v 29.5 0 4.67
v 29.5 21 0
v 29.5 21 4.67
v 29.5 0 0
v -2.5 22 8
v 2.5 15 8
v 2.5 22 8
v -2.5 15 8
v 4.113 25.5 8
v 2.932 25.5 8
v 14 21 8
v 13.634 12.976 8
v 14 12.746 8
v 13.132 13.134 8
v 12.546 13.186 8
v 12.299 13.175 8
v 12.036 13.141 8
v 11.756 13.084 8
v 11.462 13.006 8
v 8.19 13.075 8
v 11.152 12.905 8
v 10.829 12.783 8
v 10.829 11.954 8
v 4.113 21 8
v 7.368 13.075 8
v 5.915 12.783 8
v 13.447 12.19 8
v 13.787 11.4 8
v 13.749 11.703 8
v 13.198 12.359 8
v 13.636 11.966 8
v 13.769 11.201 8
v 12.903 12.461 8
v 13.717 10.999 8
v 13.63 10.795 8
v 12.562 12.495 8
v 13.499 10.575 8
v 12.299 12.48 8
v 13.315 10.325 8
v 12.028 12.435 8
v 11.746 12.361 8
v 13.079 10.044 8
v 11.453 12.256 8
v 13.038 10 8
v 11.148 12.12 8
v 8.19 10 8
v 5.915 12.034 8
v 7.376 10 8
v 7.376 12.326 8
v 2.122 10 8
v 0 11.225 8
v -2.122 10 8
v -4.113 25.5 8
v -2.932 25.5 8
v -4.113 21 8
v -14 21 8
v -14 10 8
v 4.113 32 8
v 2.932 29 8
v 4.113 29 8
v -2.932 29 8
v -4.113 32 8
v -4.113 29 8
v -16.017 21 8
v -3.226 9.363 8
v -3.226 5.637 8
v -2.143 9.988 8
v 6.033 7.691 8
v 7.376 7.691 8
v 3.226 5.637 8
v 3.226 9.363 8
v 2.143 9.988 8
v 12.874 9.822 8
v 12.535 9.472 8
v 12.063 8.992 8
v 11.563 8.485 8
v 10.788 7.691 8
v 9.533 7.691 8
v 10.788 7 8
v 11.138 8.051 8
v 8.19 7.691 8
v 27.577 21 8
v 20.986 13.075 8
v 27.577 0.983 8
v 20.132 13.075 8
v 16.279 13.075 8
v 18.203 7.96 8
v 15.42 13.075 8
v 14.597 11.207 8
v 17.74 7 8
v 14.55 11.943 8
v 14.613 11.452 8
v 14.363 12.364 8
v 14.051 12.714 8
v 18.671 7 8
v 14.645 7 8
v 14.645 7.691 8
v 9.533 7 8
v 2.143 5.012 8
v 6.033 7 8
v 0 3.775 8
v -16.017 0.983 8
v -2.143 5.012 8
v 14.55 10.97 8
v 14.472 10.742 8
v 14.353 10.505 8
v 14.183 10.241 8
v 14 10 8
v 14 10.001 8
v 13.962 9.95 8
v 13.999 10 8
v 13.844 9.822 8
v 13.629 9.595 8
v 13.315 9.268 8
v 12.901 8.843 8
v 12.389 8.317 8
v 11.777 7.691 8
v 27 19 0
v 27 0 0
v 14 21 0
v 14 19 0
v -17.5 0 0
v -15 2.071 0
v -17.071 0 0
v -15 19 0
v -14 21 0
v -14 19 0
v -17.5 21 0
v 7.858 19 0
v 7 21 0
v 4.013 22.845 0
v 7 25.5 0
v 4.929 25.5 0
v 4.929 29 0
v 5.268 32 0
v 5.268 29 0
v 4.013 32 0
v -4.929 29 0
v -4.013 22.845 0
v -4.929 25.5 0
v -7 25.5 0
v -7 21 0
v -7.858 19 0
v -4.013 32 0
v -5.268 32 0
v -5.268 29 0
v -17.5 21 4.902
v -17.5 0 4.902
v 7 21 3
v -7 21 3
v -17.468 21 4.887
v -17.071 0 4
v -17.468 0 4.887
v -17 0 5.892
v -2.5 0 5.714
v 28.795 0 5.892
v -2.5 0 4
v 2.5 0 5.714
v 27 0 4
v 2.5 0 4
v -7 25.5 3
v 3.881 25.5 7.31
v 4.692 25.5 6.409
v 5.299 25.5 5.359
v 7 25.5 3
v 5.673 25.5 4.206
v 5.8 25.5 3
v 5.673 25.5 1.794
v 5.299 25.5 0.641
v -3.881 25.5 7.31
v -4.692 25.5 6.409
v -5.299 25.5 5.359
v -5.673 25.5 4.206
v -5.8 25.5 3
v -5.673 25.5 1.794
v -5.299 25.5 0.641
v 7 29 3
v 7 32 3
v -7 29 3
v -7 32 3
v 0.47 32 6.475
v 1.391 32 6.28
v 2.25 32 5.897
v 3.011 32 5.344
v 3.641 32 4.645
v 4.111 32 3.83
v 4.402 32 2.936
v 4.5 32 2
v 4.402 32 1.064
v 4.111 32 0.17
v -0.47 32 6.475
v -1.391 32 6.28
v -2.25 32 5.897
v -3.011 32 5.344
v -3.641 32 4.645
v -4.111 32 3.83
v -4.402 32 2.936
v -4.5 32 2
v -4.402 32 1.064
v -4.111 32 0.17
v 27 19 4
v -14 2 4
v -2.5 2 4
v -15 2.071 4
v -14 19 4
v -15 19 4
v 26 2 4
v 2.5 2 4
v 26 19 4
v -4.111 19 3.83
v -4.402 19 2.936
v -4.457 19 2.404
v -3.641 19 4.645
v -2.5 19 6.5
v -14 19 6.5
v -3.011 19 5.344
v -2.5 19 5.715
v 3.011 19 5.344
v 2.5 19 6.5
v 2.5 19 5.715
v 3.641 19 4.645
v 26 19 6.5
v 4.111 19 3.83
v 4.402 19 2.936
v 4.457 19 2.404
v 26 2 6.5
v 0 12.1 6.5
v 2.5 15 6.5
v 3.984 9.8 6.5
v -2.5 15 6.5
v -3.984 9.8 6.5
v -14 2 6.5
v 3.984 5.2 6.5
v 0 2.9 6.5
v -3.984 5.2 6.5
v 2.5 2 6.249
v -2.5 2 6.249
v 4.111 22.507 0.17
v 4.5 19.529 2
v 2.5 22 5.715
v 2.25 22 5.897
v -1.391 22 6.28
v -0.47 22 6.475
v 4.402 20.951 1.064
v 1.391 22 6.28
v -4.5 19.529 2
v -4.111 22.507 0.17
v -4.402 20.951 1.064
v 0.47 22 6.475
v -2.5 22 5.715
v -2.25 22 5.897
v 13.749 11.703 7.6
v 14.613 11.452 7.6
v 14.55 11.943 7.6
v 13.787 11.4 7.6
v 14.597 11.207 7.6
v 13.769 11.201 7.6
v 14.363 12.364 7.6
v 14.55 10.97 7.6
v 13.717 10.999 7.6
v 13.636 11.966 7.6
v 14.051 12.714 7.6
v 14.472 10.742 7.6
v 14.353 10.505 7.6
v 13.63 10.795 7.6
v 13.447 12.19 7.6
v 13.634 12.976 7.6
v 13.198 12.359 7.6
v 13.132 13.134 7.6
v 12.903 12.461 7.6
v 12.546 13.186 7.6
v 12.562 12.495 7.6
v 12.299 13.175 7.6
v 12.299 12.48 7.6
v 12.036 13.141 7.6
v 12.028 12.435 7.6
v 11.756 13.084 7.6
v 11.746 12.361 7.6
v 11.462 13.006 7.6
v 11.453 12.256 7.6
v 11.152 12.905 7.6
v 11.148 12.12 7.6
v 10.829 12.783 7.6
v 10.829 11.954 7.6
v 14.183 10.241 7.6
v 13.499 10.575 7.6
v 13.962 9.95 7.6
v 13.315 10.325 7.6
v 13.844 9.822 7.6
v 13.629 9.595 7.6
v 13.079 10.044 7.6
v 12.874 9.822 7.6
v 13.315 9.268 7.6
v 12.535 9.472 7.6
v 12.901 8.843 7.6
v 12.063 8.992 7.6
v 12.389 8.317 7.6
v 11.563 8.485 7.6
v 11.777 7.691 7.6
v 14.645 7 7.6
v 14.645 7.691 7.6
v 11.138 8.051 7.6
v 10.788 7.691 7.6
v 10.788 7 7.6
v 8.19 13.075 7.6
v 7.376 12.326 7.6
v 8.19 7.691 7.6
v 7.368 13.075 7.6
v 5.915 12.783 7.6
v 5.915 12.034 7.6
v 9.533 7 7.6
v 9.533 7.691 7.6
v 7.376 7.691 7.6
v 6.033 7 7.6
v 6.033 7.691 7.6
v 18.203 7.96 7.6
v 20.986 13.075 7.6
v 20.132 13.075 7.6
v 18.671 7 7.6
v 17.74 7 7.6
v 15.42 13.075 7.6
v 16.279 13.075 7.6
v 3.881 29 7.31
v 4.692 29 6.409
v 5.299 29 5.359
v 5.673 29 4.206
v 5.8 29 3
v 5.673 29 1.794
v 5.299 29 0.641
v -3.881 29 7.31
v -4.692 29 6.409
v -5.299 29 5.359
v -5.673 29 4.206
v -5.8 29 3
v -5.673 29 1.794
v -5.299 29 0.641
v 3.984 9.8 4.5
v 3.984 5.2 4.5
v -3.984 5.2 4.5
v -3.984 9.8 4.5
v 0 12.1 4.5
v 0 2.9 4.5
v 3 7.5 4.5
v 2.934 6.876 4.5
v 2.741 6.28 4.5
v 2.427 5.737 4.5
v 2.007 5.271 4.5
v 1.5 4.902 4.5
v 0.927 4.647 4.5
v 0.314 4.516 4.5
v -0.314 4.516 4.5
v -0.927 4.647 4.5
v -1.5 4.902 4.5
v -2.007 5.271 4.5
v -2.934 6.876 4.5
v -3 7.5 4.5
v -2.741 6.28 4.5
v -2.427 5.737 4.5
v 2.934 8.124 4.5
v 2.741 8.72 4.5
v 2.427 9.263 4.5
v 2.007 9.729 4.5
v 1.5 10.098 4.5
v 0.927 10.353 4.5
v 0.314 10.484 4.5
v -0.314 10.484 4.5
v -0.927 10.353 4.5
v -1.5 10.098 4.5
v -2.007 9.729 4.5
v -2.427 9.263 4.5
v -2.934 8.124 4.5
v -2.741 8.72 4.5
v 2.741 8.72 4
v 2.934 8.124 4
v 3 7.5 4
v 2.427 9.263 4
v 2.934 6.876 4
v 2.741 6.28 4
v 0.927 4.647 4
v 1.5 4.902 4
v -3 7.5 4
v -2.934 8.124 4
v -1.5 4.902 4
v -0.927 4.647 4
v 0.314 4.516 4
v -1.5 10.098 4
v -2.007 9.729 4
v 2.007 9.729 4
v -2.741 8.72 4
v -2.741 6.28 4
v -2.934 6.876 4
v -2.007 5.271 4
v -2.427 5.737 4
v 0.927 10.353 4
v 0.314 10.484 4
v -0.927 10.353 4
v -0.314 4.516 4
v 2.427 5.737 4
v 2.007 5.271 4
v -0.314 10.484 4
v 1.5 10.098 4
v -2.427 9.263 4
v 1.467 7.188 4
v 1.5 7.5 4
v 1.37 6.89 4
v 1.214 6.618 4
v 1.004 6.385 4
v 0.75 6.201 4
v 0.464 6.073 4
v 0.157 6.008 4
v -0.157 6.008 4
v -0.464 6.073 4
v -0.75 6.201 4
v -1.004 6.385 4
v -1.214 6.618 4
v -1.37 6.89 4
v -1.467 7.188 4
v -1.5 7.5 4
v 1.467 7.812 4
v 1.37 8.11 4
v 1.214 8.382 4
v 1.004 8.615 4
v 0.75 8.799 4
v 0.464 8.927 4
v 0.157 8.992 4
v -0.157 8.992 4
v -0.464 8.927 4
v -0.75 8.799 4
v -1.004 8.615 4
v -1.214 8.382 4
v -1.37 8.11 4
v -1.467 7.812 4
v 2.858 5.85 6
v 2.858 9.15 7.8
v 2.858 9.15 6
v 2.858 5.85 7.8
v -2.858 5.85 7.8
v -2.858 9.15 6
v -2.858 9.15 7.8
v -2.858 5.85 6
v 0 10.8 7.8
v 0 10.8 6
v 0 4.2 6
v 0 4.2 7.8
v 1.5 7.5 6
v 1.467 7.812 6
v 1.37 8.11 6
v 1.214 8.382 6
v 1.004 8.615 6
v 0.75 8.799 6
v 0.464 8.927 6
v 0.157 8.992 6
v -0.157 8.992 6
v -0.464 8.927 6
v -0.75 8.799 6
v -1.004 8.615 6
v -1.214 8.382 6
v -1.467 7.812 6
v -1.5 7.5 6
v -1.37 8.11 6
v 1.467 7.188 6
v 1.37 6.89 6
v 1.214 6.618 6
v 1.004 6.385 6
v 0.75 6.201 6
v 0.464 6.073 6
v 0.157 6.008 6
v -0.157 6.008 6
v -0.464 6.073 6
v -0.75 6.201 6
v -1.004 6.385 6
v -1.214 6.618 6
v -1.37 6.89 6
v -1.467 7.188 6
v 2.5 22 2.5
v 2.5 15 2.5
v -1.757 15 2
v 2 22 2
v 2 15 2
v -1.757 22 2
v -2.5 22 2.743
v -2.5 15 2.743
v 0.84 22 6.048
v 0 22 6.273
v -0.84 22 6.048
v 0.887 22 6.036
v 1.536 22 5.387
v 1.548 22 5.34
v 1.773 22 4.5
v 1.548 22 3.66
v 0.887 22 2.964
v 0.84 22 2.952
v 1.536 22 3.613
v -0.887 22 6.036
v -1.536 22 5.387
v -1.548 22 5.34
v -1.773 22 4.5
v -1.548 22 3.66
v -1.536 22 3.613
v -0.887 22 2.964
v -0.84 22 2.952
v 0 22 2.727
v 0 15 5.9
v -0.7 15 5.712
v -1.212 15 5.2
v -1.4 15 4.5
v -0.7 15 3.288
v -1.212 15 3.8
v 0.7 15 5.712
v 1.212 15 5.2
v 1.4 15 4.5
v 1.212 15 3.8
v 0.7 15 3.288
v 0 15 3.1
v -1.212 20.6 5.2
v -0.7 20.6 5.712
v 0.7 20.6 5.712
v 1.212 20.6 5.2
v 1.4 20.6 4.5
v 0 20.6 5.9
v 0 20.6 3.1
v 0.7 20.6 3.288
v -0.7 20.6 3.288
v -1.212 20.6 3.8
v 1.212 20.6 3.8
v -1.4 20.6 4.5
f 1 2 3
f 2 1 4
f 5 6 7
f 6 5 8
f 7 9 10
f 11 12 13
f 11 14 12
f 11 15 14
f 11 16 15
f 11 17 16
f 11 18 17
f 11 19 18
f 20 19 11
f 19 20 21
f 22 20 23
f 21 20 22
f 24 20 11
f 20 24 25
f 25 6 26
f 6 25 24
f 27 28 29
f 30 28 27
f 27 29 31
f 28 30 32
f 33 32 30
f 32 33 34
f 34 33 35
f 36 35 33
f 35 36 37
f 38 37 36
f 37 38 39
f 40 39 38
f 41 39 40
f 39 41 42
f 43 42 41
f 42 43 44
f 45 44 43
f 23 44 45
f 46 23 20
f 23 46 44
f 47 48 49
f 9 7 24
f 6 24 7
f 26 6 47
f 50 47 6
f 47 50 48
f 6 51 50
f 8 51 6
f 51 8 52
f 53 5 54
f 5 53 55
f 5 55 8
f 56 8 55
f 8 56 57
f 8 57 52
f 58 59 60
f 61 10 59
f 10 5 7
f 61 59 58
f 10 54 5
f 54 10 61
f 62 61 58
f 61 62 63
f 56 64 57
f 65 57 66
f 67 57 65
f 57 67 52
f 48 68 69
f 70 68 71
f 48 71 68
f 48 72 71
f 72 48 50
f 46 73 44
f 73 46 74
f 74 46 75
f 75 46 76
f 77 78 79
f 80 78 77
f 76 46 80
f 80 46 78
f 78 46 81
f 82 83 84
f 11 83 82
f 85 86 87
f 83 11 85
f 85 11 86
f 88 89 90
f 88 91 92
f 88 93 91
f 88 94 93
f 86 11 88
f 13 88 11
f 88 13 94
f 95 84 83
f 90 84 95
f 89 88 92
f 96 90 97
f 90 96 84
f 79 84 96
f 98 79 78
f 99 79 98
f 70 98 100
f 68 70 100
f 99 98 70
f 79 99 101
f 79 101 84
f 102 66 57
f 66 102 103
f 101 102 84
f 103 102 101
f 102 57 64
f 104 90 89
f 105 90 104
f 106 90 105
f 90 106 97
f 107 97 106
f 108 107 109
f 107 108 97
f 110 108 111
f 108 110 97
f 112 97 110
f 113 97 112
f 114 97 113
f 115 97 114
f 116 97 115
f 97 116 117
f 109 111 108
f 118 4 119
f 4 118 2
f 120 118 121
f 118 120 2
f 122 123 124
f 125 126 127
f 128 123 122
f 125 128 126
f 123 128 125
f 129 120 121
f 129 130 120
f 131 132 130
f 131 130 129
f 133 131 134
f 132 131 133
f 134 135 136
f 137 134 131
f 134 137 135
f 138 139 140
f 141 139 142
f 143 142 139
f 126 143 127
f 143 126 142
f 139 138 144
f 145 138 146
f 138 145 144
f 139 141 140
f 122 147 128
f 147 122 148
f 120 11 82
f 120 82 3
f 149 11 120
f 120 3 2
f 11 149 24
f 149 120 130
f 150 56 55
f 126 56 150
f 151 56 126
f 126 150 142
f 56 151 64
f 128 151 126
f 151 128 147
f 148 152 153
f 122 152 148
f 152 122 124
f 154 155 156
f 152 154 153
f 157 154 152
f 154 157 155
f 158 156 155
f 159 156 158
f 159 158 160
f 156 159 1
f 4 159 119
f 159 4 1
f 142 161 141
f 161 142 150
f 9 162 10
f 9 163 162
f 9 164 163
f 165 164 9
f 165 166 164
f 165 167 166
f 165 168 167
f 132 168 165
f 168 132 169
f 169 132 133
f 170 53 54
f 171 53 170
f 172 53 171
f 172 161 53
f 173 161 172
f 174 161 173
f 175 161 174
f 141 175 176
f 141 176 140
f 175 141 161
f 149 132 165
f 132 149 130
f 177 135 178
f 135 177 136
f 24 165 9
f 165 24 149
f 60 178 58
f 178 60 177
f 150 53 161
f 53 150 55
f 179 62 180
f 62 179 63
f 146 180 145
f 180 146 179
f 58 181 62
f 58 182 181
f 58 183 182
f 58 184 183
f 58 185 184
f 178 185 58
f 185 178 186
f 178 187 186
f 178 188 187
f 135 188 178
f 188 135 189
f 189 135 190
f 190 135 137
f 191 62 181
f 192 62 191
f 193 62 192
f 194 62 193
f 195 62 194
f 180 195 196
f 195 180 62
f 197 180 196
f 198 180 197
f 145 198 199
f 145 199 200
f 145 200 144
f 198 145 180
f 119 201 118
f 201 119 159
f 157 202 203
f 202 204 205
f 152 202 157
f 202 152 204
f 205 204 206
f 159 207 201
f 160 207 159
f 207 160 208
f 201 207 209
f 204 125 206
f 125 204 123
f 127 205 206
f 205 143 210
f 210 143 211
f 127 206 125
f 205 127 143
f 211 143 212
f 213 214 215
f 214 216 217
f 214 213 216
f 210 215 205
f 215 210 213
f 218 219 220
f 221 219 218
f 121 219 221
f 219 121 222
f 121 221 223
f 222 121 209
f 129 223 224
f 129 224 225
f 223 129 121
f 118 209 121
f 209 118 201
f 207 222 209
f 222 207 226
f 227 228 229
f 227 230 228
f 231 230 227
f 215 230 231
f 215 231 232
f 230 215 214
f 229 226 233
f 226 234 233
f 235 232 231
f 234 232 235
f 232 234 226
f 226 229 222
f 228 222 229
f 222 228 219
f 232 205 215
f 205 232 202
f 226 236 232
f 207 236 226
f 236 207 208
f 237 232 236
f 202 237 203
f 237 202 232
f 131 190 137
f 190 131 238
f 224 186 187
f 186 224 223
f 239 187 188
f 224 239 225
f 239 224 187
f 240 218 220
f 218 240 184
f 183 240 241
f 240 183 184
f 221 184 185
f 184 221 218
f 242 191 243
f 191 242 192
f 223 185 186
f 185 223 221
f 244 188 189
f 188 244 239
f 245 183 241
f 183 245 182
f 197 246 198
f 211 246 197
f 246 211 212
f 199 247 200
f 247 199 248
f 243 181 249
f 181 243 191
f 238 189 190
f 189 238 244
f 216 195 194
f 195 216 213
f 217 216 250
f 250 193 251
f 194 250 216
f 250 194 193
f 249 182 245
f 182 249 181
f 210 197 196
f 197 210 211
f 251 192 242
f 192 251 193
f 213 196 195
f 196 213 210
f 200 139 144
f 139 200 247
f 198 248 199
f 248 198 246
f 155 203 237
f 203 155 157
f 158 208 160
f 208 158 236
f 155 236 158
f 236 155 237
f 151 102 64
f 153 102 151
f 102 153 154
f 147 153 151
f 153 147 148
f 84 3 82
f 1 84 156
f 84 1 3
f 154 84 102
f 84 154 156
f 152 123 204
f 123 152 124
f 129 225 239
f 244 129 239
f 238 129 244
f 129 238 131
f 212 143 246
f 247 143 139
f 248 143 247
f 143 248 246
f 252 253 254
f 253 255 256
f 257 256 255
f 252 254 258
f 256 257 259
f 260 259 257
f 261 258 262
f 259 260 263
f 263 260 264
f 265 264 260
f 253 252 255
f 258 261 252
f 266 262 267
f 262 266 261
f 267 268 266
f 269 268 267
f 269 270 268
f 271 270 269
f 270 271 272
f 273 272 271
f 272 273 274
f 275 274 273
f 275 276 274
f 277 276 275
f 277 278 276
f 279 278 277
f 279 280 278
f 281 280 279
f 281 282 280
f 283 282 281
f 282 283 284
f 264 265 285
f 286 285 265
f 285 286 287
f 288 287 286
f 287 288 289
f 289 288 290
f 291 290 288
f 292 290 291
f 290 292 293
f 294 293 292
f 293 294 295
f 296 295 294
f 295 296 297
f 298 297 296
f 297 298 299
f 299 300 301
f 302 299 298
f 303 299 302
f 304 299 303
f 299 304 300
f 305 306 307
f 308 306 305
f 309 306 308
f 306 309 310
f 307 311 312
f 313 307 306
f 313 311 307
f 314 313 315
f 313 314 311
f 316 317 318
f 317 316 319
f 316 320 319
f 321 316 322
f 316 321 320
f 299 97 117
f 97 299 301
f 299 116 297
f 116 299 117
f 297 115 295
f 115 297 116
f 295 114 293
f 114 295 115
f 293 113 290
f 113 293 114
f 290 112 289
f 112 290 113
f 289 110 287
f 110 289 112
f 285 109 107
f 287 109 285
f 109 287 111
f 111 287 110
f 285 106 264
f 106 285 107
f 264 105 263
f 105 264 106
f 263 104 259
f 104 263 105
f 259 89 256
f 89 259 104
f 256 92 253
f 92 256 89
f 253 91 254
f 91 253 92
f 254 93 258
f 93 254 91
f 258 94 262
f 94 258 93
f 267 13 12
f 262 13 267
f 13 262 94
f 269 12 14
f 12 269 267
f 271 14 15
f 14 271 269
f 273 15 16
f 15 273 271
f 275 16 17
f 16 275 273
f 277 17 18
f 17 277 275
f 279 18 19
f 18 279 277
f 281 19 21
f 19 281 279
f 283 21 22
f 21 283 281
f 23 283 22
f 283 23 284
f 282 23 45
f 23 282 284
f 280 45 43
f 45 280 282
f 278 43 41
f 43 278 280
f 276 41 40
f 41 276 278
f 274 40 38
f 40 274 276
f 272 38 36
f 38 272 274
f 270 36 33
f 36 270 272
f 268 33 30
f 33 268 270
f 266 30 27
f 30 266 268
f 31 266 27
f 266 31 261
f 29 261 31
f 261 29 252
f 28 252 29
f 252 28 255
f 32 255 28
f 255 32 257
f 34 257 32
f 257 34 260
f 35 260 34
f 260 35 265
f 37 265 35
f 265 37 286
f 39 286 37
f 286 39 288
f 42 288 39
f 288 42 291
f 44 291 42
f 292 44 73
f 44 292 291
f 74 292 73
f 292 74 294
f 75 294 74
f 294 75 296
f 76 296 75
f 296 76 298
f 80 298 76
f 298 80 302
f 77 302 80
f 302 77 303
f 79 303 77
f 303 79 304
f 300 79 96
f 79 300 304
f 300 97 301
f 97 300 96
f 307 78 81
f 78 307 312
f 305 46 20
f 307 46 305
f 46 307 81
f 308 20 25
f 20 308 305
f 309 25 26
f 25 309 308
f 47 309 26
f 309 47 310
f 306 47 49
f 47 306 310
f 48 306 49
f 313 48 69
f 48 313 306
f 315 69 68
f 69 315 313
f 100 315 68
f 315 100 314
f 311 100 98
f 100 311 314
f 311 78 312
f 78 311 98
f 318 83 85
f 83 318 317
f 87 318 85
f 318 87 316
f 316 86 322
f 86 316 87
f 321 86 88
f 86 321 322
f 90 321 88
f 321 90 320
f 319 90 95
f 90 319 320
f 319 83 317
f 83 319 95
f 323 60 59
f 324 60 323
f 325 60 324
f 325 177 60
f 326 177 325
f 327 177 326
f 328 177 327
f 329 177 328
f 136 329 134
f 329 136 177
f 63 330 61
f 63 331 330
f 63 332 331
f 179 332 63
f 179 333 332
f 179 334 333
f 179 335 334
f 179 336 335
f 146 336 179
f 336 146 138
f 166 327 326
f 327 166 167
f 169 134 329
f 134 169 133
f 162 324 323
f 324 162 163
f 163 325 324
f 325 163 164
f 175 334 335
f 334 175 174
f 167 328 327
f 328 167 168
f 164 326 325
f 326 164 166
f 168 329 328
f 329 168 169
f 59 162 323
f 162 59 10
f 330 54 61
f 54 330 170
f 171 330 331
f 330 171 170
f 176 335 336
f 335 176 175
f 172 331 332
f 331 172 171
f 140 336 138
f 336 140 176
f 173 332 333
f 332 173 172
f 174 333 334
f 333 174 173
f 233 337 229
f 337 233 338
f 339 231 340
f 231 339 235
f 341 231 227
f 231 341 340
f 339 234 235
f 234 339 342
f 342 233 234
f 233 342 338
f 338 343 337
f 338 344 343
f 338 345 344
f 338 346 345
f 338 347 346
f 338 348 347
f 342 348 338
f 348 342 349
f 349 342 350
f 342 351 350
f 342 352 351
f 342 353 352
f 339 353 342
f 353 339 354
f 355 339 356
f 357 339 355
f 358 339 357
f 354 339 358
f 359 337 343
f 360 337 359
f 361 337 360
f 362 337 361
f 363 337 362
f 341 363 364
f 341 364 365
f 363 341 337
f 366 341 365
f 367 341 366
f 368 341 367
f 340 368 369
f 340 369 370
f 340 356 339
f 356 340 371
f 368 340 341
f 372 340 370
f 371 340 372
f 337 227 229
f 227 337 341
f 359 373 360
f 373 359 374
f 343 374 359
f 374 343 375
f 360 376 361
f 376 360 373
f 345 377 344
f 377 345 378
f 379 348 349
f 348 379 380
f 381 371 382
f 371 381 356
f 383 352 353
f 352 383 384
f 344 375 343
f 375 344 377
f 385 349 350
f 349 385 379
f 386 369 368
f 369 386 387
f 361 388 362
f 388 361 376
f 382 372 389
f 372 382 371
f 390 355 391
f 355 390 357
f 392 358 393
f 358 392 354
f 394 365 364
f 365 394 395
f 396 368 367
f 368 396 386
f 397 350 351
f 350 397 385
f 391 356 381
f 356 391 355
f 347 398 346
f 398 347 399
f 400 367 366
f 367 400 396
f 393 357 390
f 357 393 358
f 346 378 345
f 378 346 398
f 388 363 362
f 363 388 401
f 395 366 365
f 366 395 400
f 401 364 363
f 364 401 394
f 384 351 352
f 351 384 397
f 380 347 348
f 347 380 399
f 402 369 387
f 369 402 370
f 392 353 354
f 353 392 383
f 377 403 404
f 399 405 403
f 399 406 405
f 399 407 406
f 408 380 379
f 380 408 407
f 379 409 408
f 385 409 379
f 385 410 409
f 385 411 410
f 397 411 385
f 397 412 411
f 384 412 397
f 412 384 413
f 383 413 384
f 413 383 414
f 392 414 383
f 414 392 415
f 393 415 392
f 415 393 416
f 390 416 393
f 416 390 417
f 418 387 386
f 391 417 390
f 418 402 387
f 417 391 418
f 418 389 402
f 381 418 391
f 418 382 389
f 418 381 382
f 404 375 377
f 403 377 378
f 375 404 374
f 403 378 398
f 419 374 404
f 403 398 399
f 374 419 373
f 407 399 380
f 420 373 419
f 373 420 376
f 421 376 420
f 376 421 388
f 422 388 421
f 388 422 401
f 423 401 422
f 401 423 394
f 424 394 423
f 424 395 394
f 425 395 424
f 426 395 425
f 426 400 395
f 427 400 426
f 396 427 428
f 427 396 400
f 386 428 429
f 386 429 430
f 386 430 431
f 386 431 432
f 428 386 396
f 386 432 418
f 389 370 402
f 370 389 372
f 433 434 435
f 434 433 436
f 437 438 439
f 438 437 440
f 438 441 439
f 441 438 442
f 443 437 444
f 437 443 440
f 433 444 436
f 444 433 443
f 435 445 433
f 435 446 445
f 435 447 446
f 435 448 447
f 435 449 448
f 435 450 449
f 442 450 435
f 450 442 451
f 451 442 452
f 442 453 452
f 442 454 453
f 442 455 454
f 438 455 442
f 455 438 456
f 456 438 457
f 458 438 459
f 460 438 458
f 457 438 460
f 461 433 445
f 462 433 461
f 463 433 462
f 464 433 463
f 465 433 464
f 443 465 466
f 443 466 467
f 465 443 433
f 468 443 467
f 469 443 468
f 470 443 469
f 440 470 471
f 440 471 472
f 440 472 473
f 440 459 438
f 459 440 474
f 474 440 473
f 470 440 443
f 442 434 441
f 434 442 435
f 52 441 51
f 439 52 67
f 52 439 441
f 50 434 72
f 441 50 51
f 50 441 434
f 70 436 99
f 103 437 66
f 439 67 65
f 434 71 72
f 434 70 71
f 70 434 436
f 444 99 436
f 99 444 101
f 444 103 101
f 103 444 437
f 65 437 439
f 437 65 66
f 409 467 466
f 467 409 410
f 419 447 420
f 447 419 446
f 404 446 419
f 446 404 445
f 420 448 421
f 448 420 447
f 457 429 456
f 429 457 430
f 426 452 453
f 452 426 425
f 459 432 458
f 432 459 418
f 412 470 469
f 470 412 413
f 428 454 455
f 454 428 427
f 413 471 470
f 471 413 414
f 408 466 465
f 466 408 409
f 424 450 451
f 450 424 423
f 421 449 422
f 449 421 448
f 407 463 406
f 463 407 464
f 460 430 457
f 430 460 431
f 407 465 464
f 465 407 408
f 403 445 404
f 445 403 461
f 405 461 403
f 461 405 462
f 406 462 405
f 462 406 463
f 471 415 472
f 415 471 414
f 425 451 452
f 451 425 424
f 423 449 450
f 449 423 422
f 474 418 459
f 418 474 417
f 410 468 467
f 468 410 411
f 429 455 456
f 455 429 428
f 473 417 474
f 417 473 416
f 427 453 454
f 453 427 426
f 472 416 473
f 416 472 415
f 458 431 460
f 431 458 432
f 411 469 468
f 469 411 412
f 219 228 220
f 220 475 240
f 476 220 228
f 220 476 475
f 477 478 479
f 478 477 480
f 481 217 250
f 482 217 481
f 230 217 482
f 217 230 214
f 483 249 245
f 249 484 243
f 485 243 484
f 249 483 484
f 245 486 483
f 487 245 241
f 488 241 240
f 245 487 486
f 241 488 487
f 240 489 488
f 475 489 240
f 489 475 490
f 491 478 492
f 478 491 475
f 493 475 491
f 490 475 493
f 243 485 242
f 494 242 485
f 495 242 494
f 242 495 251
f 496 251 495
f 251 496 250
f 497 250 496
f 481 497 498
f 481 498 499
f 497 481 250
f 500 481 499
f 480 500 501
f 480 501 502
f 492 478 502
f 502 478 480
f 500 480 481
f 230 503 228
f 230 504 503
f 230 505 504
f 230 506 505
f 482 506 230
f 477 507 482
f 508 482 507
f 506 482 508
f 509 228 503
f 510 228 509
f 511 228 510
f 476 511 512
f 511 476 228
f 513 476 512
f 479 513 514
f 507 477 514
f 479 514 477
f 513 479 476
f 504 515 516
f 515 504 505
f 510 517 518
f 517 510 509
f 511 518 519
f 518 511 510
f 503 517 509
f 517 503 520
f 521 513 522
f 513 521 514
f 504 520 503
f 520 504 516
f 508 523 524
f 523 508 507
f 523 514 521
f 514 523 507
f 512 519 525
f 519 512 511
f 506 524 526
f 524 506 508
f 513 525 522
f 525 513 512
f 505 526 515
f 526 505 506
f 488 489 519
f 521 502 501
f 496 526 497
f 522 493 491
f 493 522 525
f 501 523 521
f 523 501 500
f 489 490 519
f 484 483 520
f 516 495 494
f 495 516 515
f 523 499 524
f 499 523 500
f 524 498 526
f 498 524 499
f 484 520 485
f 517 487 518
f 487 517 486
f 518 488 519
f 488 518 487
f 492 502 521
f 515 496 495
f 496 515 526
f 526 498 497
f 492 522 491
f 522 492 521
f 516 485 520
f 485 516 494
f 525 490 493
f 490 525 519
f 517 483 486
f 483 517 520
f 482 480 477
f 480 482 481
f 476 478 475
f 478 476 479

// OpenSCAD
module cover()
{
    translate([ -17.5, 0, 0 ]) cube([ 47, 21, 8 ]);  // cover
    translate([ -7, 19, 0 ]) cube([ 3, 6.5, 3 ]);  // tube reinforcement
    translate([ 4, 19, 0 ]) cube([ 3, 6.5, 3 ]);  // tube reinforcement
    translate( [ 0 , 32 , 3 ] ) rotate( [90,0,0] ) cylinder( h = 12, r = 7, $fn=6);  // cable tube outer

}

module inside_cut(){
    translate([ -15, -1, -1 ]) cube( [42,20,5] );     // inside cut
    translate([ -14, 2, 4 ])  cube( [40,17,2.5 ] );     // inside cut
    
    translate( [ 0 , 32 , 2 ] ) rotate( [90,0,0] ) cylinder( h = 16, r = 4.5, $fn=30);  // cable tube inner
    
    translate([ -14, 10, -5 ])  cube( [28,25,5 ] );     // inside cut
    translate([ -14, 10, 8 ])  cube( [28,25,3 ] );     // inside cut
    
    translate([ -2.5, -6, 1 ])  rotate([15,0,0]) cube( [5,10,3 ] );     // LED
    
    translate([ -22, -5, 7 ]) rotate([0,25,0])  cube( [5,40,6 ] );     // corners
    translate([ 27, -5, 9 ]) rotate([0,60,0])  cube( [6,40,5 ] );     // corners
    translate([ 30, -5, 7 ]) rotate([0,25,90])  cube( [5,50,5 ] );     // corners
    
    translate([ 15, -5, -1 ]) rotate([0,0,45])  cube( [5,5,5 ] );     // corners
    translate([ -15, -5, -1 ]) rotate([0,0,45])  cube( [5,5,5 ] );     // corners
    
    
    translate([ 8, 13, -10]) rotate([0,-45,45])  cube( [10,10,10 ] );     // corners
    translate([ -8, 13, -10]) rotate([0,-45,-45])  cube( [10,10,10 ] );     // corners
    translate([5,7,7.6])linear_extrude(height = 0.4) {
       text("12V",size=6, center=true,font="Arial Black");
     }
    }

    module ziptie(){
        difference(){
        translate( [ 0 , 29 , 3 ] ) rotate( [90,0,0] ) cylinder( h = 3.5, r = 10, $fn=30);  // cable tube outer
        translate( [ 0 , 29 , 3 ] ) rotate( [90,0,0] ) cylinder( h = 3.5, r = 5.8, $fn=30);  // cable tube outer
        }
        }

    module filament_holder(){
        difference(){
        translate([ -2.5,15, 2 ]) rotate([0,0,0])  cube( [5,7,6 ] );     // body
        translate( [ 0 , 24 , 4.5 ] ) rotate( [90,0,0] ) cylinder( h = 10, r = 1.4, $fn=12);  // filament
        translate( [ 0 , 22.1 , 4.5 ] ) rotate( [90,0,0] ) cylinder( h = 1.5, r1 = 1.8, r2=1.4, $fn=12);  // filament

        translate([ -5,15, 1 ]) rotate([0,45,0])  cube( [3,15,3 ] );     // corners            
        translate([ 1,15, 1 ]) rotate([0,45,0])  cube( [3,15,3 ] );     // corners
        }
    }
    module m3_screw(){
        
    translate( [ 0 , 7.5 , 6 ] ) rotate( [0,0,90] ) cylinder( h = 2.5, r = 3.3, $fn=6);  // M3 HEAD
    translate( [ 0 , 7.5 , 7.8] ) rotate( [0,0,90] ) cylinder( h = 0.8, r1 = 3.3, r2=5, $fn=6);  // M3 HEAD
    translate( [ 0 , 7.5 , -10 ] ) rotate( [0,0,0] ) cylinder( h = 20, r = 1.5, $fn=30);  // M3 thread
    }
    
    module nut_trap(){
    translate( [ 0 , 7.5 , 4.5 ] ) rotate( [0,0,90] ) cylinder( h = 2.5, r = 4.6, $fn=6);  // M3 HEAD
    translate( [ 0 , 7.5 , 4 ] ) rotate( [0,0,0] ) cylinder( h = 1, r = 3, $fn=30);      
    }
    
    difference(){
    union(){
        difference(){
        cover();
        inside_cut();
            ziptie();
        }
        nut_trap();
    }   
    m3_screw();
    }
    
    filament_holder();
    
